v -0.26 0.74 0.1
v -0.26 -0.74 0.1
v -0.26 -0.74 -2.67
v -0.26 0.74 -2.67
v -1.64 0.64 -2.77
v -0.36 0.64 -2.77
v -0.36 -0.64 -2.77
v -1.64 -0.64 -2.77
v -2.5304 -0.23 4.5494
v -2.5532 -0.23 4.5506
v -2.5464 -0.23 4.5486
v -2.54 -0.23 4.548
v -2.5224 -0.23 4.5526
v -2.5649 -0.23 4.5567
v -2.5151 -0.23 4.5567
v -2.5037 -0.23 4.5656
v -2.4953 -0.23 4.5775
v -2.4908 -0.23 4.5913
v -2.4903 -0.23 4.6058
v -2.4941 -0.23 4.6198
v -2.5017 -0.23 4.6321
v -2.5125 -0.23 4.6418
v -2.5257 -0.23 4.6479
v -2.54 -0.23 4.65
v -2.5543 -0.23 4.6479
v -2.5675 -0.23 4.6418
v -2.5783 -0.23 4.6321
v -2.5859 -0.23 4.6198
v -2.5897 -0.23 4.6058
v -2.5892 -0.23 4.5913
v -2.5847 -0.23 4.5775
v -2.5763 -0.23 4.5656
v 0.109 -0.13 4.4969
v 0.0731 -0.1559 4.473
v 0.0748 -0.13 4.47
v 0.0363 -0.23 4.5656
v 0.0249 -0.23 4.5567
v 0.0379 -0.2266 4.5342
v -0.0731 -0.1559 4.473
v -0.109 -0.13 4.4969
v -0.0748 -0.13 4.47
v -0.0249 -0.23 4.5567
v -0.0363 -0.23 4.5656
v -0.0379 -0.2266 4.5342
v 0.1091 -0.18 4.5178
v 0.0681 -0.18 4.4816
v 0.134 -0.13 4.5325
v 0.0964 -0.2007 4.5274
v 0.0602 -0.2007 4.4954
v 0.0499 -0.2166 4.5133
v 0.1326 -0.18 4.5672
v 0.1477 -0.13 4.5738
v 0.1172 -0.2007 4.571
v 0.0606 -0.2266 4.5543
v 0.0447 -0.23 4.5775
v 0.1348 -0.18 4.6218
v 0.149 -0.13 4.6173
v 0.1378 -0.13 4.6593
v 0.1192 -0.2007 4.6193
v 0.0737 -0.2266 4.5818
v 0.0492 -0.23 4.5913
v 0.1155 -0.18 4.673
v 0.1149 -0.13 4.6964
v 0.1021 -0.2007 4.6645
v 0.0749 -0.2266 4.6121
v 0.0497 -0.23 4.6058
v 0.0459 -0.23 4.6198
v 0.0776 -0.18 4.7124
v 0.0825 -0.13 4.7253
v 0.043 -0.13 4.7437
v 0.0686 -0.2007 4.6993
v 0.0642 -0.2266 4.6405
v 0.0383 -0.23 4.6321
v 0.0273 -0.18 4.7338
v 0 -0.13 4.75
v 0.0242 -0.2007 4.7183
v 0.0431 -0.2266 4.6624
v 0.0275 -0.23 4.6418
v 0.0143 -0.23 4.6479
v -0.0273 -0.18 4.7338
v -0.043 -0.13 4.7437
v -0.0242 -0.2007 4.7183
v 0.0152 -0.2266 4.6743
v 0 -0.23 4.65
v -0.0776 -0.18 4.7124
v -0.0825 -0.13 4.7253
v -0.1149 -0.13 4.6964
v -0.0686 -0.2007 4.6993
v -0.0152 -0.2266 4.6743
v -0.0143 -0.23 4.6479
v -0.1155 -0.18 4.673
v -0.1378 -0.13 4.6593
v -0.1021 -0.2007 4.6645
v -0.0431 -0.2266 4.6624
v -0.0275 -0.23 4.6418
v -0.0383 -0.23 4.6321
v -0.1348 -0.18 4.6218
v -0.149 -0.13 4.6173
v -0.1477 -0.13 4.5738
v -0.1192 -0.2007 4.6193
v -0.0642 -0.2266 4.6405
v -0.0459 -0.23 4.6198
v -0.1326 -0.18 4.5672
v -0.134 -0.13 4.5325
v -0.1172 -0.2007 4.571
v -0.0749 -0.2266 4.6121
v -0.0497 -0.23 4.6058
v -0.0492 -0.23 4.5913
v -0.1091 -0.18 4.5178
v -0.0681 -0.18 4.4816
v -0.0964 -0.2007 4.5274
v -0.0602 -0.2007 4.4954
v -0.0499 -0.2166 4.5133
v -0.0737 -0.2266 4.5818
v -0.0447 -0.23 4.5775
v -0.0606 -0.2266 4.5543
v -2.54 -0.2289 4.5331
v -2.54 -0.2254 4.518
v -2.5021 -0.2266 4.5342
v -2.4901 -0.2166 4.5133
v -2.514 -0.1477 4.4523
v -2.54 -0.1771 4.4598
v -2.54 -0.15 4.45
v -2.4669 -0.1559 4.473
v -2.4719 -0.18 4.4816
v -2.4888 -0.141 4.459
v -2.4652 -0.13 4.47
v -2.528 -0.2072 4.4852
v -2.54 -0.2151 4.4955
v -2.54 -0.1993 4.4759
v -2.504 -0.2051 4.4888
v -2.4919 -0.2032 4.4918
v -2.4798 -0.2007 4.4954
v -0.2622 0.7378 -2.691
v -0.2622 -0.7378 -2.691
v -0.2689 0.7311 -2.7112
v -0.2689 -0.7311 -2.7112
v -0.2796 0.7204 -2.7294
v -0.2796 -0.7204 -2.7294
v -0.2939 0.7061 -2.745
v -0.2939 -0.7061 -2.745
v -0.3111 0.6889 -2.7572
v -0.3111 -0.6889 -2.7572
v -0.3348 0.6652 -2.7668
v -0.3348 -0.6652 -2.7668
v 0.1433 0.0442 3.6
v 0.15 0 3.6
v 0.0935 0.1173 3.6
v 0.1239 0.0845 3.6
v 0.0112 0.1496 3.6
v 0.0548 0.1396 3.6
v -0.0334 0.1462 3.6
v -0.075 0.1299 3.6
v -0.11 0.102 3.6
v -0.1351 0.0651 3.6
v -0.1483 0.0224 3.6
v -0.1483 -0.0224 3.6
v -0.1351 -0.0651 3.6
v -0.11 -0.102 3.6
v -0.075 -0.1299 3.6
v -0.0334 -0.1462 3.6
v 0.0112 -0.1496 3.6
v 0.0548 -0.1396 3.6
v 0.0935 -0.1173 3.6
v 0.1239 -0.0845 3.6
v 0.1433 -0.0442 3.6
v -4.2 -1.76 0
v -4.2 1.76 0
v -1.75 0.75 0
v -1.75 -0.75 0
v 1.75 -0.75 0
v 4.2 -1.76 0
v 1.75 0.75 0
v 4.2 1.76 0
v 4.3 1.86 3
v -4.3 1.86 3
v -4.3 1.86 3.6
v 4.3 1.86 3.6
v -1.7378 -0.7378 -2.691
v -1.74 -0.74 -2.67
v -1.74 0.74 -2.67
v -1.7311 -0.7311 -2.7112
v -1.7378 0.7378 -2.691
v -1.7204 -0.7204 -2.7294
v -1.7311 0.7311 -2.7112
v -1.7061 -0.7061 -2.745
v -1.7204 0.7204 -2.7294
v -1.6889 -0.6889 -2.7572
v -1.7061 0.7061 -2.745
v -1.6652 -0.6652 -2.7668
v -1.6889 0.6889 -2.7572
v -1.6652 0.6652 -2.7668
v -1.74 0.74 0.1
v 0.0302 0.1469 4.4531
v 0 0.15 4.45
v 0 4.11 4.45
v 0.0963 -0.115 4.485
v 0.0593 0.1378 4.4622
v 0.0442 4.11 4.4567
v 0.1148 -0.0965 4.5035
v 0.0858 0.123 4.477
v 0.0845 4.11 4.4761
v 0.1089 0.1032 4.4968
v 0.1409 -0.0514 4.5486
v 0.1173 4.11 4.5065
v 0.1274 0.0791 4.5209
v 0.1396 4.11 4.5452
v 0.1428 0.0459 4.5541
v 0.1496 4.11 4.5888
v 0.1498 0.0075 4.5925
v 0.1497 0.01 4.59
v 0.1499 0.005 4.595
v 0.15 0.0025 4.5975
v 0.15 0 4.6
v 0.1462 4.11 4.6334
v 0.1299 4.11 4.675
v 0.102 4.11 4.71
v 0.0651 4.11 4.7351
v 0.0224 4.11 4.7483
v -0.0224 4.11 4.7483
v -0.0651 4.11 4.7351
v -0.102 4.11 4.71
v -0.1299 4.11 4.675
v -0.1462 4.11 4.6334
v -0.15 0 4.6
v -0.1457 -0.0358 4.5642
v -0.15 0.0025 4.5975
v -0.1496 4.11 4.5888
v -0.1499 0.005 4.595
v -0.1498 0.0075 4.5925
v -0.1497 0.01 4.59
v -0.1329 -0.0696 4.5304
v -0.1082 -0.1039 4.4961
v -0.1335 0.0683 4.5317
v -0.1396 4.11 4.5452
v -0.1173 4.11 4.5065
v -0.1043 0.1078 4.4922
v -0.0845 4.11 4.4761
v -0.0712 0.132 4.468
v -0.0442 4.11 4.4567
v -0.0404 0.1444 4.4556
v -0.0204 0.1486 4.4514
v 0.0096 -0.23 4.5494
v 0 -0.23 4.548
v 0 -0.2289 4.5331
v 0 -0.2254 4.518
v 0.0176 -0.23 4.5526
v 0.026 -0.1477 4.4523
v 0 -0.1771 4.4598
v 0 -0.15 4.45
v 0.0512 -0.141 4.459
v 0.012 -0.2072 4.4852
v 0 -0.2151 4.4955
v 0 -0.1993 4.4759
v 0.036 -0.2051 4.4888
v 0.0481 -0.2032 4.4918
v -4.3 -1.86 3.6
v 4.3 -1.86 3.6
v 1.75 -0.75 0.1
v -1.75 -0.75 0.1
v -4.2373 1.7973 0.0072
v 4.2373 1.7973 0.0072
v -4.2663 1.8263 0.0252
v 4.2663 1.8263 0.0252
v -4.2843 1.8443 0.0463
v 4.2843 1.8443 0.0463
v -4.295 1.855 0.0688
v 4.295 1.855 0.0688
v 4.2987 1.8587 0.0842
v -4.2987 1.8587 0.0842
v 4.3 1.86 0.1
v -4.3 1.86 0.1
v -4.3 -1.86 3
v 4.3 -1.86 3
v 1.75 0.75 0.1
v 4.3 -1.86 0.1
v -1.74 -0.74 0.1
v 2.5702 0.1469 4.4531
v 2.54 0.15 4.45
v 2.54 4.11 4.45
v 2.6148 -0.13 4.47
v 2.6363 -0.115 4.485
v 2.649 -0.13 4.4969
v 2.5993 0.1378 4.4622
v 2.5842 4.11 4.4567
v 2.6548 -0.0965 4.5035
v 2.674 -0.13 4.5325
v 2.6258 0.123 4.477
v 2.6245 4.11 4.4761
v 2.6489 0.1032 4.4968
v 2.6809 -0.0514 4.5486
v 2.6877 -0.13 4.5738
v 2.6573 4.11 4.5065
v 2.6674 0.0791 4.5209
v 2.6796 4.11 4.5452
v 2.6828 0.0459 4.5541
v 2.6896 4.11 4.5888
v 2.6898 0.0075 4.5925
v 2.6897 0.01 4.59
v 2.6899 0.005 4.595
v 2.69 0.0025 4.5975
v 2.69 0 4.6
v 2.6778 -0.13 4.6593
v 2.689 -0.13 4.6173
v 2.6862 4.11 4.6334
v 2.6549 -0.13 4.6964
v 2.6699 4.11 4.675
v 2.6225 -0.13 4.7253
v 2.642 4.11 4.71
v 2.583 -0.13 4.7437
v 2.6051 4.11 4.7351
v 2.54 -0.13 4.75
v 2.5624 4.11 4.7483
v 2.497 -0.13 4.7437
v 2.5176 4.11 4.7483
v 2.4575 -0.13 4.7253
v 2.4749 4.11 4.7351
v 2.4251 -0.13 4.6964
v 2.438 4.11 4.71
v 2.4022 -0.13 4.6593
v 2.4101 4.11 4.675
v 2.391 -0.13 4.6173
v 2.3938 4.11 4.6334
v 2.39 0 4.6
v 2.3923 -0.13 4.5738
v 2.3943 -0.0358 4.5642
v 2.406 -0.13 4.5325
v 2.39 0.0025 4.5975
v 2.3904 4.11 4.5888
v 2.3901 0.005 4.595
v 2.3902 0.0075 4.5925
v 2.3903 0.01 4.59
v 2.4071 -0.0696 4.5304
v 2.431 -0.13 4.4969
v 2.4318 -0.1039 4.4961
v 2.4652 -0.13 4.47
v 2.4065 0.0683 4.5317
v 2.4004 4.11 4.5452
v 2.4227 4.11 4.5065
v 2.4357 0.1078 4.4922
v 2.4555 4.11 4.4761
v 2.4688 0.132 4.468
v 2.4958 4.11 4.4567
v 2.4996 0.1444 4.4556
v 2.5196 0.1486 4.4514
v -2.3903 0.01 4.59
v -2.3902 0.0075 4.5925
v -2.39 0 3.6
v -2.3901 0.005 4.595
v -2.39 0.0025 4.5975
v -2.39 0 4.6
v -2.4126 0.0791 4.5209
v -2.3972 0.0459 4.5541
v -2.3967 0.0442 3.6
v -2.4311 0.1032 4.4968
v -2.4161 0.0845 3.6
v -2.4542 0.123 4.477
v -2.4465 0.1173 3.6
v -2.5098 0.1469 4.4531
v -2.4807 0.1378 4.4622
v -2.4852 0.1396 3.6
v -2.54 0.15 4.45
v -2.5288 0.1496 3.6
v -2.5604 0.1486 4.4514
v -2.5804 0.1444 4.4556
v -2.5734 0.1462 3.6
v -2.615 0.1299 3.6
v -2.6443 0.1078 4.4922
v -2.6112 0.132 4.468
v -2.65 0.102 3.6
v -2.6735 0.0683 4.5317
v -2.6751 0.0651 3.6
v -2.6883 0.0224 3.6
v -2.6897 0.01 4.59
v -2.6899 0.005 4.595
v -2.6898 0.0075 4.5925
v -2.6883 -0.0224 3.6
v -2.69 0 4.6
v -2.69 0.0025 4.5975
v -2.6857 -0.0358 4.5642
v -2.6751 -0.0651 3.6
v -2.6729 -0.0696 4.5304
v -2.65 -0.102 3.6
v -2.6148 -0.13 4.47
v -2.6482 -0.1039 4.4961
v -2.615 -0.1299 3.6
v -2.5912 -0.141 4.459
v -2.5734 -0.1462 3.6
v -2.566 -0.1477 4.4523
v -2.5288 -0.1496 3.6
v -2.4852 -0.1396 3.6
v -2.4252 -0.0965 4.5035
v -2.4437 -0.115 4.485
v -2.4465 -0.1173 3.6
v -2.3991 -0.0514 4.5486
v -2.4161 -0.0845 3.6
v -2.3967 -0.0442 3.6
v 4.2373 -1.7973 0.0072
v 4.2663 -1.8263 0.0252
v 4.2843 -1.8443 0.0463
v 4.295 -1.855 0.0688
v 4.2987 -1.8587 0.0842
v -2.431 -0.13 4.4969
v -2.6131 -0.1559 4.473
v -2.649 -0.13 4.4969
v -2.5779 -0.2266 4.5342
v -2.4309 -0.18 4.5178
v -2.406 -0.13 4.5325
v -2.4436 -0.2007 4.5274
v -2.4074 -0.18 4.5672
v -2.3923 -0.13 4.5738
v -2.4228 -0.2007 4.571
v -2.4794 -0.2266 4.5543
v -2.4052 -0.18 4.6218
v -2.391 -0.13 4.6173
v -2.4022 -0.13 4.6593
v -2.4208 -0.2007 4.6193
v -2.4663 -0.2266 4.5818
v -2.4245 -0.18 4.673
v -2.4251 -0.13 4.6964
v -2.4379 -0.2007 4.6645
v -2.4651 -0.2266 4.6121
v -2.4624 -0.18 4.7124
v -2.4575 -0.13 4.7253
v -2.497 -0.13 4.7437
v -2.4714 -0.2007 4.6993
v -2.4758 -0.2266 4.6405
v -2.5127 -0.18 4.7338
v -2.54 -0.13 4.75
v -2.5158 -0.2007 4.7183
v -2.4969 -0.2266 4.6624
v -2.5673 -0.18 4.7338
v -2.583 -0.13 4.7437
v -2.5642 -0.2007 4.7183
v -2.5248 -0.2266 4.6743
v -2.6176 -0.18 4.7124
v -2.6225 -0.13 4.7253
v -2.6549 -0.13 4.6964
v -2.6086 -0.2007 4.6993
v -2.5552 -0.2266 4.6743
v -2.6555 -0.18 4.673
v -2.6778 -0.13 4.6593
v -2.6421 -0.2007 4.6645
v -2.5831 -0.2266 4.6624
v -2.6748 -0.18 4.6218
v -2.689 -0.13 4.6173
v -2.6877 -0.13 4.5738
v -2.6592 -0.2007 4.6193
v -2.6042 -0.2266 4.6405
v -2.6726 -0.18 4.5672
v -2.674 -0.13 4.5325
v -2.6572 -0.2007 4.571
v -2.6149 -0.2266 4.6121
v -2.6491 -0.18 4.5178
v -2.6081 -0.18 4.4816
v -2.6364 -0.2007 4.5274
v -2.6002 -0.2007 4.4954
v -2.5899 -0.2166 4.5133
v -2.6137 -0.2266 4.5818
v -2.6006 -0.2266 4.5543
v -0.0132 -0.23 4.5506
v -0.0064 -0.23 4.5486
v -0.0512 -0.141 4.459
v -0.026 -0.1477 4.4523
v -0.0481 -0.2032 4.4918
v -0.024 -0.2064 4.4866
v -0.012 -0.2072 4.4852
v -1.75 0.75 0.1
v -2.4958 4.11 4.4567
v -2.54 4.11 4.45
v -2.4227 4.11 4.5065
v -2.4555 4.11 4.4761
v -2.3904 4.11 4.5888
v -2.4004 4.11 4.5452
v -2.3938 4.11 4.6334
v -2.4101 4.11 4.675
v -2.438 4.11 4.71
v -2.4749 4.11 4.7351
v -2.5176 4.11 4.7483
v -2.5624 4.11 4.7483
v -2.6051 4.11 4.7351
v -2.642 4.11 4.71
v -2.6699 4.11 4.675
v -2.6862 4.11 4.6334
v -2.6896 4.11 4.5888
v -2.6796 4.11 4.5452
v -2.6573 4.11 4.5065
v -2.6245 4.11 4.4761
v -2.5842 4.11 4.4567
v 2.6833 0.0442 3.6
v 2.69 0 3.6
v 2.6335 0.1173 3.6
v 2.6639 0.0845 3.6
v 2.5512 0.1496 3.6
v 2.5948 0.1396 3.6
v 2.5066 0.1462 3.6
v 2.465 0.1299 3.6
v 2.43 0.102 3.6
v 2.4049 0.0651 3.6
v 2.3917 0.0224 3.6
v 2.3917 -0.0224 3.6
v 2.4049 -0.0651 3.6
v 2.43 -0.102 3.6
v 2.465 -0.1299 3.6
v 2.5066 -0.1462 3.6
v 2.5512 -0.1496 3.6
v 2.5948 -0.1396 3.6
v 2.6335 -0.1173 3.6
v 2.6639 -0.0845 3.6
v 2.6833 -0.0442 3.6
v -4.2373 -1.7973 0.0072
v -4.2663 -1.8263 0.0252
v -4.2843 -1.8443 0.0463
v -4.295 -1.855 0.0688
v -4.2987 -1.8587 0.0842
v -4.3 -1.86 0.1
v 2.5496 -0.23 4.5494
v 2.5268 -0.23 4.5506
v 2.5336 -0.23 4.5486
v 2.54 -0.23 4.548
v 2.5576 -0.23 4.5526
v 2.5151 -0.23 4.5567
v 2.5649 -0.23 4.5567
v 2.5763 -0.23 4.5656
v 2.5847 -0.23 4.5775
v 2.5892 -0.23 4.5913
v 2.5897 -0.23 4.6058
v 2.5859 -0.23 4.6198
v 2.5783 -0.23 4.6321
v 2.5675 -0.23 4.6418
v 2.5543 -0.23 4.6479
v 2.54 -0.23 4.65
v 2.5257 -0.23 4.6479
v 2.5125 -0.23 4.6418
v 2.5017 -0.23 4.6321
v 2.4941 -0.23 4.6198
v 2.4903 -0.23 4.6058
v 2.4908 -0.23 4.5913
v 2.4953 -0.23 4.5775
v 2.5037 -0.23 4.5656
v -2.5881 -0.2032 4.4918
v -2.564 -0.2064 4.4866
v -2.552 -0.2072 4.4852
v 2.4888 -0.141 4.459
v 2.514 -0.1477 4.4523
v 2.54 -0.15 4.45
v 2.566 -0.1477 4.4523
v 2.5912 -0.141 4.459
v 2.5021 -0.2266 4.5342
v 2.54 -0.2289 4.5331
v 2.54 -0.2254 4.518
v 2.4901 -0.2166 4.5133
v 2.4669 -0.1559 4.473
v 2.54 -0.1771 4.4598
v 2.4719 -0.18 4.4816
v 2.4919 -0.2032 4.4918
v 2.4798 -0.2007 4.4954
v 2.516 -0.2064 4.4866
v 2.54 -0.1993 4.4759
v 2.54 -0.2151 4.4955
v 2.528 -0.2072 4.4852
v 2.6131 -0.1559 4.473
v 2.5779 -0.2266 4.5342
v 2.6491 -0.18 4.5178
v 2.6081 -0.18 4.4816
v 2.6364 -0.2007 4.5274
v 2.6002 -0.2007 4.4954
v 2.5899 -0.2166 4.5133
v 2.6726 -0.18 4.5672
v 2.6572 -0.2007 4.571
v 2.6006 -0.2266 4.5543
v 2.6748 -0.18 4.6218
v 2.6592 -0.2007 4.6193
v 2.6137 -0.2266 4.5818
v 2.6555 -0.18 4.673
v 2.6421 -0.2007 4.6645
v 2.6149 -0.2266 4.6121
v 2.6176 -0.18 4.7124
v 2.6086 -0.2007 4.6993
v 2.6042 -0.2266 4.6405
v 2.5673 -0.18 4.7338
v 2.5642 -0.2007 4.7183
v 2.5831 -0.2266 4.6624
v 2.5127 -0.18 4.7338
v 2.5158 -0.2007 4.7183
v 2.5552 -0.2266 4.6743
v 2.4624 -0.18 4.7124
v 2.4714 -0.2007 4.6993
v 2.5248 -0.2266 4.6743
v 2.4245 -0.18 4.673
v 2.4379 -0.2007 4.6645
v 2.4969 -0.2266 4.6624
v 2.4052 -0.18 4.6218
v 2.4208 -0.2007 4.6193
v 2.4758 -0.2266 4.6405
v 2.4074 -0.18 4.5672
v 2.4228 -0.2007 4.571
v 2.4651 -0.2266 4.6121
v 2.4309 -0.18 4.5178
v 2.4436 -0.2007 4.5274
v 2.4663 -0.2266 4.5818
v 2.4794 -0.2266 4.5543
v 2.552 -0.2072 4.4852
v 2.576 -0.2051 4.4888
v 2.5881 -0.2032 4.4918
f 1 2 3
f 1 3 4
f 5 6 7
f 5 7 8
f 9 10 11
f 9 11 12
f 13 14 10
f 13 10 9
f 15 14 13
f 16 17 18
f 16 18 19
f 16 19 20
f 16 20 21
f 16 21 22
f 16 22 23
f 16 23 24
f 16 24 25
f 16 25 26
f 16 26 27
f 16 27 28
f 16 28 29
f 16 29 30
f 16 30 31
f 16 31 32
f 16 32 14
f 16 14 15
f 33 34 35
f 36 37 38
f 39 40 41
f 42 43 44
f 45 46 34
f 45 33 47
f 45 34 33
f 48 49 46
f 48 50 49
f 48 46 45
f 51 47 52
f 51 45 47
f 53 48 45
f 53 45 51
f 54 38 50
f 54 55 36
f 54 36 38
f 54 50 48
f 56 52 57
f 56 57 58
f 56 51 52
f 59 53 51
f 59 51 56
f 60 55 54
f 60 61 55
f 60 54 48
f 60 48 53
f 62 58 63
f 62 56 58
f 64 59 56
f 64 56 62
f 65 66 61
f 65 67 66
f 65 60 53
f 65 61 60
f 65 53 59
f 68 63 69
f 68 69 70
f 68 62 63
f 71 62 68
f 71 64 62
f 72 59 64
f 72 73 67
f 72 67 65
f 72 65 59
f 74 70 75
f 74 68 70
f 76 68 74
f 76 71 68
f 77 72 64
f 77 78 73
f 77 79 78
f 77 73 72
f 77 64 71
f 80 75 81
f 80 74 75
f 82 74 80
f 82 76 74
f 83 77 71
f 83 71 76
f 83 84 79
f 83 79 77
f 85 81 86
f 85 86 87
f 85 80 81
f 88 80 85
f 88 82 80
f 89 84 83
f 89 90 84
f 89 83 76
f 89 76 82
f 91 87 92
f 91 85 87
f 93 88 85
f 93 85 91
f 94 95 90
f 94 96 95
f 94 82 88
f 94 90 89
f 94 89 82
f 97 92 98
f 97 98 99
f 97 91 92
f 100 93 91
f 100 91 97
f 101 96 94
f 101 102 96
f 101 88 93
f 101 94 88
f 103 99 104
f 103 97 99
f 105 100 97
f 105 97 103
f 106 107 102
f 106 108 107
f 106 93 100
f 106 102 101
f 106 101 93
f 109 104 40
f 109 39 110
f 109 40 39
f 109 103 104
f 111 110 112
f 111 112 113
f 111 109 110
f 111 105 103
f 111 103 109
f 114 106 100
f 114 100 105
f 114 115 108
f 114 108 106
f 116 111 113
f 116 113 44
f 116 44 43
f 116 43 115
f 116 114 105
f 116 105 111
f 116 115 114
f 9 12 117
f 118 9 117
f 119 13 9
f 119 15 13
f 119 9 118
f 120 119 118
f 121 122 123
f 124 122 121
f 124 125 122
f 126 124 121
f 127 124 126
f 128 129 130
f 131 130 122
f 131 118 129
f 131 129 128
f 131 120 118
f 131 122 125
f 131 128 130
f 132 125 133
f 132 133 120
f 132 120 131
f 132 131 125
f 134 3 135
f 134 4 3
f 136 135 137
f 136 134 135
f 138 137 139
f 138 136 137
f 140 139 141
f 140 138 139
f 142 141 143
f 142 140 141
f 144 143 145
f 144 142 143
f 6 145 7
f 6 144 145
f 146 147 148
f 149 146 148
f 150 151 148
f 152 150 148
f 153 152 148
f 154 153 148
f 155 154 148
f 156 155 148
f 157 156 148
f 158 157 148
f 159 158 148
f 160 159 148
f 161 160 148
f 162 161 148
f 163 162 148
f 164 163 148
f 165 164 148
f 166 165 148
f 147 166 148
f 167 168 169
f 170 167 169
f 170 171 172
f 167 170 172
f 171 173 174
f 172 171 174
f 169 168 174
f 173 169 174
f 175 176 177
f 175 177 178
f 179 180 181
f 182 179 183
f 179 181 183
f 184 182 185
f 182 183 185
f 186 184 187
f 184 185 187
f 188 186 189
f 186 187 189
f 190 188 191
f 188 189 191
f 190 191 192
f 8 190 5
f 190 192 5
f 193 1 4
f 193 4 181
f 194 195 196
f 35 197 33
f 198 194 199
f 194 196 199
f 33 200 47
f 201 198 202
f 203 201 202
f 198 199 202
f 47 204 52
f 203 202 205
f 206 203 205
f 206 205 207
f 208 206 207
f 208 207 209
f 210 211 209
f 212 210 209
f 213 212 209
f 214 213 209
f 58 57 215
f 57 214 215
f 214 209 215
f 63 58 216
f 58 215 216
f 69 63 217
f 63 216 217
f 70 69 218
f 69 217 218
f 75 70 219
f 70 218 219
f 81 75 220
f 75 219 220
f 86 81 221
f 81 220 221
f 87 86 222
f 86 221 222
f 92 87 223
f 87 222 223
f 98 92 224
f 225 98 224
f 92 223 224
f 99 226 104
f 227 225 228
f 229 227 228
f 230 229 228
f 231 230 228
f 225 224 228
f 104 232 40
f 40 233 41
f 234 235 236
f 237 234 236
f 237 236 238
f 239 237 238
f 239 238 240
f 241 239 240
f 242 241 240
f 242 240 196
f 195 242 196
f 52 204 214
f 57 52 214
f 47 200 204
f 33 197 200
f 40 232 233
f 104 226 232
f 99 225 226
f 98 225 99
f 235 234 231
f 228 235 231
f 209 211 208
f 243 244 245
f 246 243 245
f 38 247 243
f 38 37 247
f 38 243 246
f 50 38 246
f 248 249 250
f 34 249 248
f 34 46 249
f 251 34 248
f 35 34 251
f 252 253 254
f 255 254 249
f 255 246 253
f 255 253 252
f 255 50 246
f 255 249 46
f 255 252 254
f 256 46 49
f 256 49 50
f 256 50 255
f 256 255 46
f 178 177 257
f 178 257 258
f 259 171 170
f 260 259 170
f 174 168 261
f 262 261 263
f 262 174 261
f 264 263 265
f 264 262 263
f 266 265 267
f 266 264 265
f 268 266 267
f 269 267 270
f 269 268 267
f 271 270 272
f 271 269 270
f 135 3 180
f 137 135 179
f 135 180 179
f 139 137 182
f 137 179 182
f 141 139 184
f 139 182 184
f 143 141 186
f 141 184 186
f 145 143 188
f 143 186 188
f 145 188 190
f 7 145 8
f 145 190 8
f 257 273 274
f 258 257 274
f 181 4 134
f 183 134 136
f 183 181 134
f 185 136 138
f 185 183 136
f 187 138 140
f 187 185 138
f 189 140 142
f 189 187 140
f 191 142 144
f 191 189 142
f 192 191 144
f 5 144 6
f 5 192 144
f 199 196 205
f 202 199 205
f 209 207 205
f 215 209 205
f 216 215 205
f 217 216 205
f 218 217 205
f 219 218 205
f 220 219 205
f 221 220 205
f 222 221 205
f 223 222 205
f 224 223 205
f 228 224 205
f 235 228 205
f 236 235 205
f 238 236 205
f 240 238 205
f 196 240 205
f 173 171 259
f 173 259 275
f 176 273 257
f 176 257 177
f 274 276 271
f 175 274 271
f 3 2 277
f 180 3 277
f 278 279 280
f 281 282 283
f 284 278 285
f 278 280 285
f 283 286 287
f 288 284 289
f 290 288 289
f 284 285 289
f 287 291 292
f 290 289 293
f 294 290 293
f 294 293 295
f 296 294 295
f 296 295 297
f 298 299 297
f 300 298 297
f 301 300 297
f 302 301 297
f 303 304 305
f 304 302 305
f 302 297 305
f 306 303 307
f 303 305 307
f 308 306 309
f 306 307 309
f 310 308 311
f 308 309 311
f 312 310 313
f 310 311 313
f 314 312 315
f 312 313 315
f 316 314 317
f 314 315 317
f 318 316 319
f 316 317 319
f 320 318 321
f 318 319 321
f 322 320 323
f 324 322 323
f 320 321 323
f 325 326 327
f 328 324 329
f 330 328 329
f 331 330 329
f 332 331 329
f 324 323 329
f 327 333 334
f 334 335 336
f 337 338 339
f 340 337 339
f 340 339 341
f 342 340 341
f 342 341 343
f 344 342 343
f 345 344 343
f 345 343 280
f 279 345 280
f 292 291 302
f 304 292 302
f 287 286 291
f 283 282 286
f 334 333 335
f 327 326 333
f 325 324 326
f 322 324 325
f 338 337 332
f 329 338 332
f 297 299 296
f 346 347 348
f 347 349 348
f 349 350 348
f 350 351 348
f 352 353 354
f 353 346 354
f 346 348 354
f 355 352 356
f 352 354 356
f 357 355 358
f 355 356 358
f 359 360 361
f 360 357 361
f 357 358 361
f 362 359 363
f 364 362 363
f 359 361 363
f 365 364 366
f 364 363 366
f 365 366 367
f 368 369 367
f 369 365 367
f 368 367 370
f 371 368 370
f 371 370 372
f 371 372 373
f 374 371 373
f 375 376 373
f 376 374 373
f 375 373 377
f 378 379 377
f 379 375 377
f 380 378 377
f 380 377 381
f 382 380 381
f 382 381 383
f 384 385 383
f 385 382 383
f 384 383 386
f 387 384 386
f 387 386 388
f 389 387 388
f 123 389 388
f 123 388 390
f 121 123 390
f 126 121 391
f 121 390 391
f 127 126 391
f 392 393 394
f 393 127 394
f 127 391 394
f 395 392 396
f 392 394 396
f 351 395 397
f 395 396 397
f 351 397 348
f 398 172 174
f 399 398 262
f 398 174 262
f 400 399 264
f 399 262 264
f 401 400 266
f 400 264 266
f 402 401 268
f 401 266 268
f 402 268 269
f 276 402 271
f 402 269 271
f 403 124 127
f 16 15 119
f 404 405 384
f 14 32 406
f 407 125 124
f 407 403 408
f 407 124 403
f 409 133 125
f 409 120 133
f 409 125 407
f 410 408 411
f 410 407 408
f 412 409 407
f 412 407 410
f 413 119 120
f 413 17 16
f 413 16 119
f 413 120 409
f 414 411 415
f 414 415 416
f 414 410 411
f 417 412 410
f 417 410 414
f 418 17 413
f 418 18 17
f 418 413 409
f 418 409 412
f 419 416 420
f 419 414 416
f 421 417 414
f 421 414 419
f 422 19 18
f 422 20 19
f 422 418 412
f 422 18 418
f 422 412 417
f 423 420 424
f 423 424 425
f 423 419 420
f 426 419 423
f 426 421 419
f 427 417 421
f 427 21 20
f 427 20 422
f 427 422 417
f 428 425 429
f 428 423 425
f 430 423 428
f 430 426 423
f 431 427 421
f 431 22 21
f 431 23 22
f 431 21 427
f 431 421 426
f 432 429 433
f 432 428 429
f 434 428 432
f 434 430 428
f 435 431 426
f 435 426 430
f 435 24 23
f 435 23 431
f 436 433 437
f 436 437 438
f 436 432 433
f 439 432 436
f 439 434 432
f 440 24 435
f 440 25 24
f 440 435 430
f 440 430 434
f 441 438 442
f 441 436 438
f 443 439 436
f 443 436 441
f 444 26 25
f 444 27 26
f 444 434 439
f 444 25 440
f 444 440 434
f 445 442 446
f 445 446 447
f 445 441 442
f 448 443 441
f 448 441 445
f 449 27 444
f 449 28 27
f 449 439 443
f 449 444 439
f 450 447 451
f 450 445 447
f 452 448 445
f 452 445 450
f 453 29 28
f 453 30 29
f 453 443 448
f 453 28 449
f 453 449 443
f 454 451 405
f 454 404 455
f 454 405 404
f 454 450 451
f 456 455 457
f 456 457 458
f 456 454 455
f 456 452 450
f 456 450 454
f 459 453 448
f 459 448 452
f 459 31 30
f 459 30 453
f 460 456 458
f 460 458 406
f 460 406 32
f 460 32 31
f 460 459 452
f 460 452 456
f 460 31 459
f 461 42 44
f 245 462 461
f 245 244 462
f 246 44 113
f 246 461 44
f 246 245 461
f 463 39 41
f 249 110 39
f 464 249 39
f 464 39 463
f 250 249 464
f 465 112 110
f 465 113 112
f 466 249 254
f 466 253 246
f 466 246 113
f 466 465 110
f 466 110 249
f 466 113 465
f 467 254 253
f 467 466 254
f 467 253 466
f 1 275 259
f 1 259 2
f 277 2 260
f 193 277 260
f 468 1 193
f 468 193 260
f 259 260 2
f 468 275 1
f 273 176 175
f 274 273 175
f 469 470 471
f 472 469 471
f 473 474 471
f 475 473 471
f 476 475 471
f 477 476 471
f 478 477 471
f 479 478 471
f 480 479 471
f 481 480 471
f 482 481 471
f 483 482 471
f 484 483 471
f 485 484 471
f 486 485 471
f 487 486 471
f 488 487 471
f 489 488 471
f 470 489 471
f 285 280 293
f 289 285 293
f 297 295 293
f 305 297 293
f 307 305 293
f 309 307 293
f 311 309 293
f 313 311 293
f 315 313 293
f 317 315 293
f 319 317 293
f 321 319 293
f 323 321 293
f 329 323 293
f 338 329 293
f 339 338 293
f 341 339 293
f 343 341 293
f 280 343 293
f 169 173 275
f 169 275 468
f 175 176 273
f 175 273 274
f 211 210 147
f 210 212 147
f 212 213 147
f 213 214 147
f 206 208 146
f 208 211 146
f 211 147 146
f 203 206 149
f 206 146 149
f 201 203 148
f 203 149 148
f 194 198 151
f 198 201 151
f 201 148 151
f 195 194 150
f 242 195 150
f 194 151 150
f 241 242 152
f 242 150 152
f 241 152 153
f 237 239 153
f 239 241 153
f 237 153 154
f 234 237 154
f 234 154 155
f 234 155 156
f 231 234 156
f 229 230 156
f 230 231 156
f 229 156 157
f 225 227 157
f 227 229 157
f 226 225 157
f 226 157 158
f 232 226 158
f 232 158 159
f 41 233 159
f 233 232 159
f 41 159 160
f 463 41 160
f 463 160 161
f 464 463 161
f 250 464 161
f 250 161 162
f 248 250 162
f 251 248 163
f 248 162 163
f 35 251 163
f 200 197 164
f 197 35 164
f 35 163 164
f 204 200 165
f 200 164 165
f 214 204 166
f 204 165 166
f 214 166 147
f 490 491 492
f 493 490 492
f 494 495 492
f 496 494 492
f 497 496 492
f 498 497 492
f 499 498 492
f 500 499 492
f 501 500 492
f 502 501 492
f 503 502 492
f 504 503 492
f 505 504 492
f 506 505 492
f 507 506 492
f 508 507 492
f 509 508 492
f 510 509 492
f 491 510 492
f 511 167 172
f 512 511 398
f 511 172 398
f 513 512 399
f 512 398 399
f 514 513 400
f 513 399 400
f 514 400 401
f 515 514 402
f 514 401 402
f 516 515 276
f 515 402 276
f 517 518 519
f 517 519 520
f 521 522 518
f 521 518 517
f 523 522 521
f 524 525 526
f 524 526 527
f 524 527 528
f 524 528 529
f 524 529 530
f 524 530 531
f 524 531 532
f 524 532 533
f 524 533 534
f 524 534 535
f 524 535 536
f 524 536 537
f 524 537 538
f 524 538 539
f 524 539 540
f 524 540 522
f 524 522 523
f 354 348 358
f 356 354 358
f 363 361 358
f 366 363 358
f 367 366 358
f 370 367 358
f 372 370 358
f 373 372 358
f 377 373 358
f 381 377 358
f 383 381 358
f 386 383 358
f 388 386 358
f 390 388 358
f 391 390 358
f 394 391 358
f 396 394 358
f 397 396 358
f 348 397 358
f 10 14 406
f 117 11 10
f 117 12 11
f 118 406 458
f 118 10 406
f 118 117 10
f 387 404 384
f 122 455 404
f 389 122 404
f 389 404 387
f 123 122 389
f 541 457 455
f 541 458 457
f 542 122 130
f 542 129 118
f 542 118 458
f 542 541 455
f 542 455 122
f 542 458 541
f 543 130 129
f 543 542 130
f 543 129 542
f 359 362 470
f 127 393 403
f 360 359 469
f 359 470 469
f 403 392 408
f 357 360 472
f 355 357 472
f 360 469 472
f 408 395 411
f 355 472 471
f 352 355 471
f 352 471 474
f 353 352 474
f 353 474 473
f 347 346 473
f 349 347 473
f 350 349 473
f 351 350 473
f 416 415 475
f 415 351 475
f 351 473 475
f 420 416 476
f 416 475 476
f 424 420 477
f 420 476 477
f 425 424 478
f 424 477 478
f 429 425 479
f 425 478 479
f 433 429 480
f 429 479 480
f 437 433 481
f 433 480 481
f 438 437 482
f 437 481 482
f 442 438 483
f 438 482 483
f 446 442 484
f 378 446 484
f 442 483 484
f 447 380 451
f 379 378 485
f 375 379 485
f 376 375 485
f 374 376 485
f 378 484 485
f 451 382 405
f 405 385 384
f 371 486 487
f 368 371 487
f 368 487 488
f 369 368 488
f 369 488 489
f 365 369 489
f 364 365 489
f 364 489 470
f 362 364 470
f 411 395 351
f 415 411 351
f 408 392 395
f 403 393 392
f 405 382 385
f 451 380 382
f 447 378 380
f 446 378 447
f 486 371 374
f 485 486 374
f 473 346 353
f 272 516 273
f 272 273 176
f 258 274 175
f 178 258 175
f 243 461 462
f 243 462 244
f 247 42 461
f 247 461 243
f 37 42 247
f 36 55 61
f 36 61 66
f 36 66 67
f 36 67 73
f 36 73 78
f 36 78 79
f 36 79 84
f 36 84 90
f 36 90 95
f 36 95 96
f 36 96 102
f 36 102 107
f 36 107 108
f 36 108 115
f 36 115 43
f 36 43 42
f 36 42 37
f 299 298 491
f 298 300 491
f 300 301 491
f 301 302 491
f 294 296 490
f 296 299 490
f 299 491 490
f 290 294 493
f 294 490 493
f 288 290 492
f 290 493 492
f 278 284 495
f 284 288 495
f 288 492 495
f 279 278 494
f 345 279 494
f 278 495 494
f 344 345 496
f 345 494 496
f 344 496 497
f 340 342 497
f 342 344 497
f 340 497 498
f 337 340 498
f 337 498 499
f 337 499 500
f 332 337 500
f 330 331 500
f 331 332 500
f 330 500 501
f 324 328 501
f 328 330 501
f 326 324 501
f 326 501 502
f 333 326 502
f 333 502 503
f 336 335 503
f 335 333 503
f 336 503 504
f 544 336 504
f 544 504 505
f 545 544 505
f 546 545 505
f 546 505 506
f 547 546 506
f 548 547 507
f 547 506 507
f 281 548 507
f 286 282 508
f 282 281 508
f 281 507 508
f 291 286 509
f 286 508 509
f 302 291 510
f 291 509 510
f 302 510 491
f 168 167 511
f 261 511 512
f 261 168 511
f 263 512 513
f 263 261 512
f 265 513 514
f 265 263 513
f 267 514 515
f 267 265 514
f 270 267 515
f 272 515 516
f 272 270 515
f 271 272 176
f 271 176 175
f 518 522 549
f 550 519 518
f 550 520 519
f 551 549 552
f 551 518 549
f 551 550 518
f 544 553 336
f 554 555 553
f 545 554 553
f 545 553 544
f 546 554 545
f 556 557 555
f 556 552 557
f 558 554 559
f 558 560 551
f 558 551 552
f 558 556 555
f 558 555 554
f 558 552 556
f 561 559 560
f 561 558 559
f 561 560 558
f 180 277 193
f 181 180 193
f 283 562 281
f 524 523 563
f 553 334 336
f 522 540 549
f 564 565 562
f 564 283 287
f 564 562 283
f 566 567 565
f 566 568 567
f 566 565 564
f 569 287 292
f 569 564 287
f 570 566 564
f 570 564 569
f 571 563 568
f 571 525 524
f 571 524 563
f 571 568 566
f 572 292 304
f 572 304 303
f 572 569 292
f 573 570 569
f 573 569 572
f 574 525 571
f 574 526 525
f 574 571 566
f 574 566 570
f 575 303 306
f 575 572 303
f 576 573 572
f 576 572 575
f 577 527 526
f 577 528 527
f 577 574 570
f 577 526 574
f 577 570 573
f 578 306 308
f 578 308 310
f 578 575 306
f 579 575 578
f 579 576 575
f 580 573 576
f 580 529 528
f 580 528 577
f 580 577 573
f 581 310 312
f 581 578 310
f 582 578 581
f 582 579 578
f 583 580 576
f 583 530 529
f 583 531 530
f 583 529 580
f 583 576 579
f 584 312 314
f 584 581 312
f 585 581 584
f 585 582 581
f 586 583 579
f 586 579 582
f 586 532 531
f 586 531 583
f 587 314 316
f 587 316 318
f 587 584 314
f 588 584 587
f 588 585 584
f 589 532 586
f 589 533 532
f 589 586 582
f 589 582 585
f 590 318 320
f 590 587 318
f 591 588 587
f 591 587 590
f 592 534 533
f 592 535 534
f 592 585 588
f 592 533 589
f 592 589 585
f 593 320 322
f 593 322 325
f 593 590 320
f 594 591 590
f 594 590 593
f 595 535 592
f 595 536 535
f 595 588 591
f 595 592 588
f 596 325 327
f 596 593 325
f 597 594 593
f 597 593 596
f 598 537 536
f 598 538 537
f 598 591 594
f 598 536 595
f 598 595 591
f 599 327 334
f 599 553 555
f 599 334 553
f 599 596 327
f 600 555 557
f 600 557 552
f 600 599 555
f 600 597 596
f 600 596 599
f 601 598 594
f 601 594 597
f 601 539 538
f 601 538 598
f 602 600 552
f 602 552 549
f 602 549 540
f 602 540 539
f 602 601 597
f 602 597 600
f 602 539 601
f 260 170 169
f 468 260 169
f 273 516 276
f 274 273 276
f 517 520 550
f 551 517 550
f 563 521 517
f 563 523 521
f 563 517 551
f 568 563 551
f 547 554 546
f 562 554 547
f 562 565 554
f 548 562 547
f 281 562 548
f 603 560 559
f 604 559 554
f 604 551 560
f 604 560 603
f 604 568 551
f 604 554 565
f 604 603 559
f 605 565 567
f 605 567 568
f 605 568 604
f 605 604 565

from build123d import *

# Parameters (mm, degrees)
SKETCH_1_W           = 8.6
SKETCH_1_H           = 3.72
EXTRUDE_1_DEPTH      = 3
SKETCH_2_W           = 8.6
SKETCH_2_H           = 3.72
EXTRUDE_2_DEPTH      = 0.6
SKETCH_3_W           = 3.5
SKETCH_3_H           = 1.5
CUT_EXTRUDE_1_DEPTH  = 0.1
SKETCH_4_W           = 1.48
SKETCH_4_H           = 1.48
EXTRUDE_3_DEPTH      = 2.87
FILLET_1_R           = 0.1
FILLET_2_R           = 0.1
SKETCH_5_R           = 0.15
EXTRUDE_4_DEPTH      = 1
EXTRUDE_4_2_DEPTH    = 1
EXTRUDE_4_3_DEPTH    = 1
SKETCH_6_R           = 0.15
EXTRUDE_5_DEPTH      = 0.24
EXTRUDE_5_DEPTH_BACK = 4.1
FILLET_3_R           = 0.1
FILLET_4_R           = 0.1
FILLET_5_R           = 0.1


with BuildPart() as part:
    # Эскиз1 → Бобышка-Вытянуть1 (new body)
    with BuildSketch(Plane.XY):
        Rectangle(SKETCH_1_W, SKETCH_1_H)
    extrude(amount=EXTRUDE_1_DEPTH)

    # Эскиз3 → Вырез-Вытянуть1 (cut)
    with BuildSketch(Plane(origin=(0, 0, 0), x_dir=(-1, 0, 0), z_dir=(0, 0, -1))):
        Rectangle(SKETCH_3_W, SKETCH_3_H)
    extrude(amount=-CUT_EXTRUDE_1_DEPTH, mode=Mode.SUBTRACT)

    # Эскиз4 → Бобышка-Вытянуть3 (add)
    with BuildSketch(Plane(origin=(0, 0, 0.1), x_dir=(-1, 0, 0), z_dir=(0, 0, -1))):
        with Locations((1, 0)):
            Rectangle(SKETCH_4_W, SKETCH_4_H)
    extrude(amount=EXTRUDE_3_DEPTH)

    # Скругление1
    fillet_1_edges = [part.edges().sort_by_distance(p)[0] for p in [
        (-1.74, 0, -2.77),
        (-1, 0.74, -2.77),
        (-0.26, 0, -2.77),
        (-1, -0.74, -2.77),
    ]]
    fillet(fillet_1_edges, radius=FILLET_1_R)

    # Скругление2
    fillet_2_edges = [part.edges().sort_by_distance(p)[0] for p in [
        (0, -1.86, 0),
        (-4.3, 0, 0),
        (0, 1.86, 0),
        (4.3, 0, 0),
    ]]
    fillet(fillet_2_edges, radius=FILLET_2_R)


with BuildPart() as body_2:
    # Эскиз2 → Бобышка-Вытянуть2 (new body)
    with BuildSketch(Plane.XY.offset(3)):
        Rectangle(SKETCH_2_W, SKETCH_2_H)
    extrude(amount=EXTRUDE_2_DEPTH)


with BuildPart() as body_3:
    # Эскиз5 → Бобышка-Вытянуть4 (new body)
    with BuildSketch(Plane.XY.offset(3.6)):
        Circle(SKETCH_5_R)
    extrude(amount=EXTRUDE_4_DEPTH)



with BuildPart() as body_4:
    # Эскиз5 → Extrude 4 2 (new body)
    with BuildSketch(Plane.XY.offset(3.6)):
        with Locations((-2.54, 0)):
            Circle(SKETCH_5_R)
    extrude(amount=EXTRUDE_4_2_DEPTH)


with BuildPart() as body_5:
    # Эскиз5 → Extrude 4 3 (new body)
    with BuildSketch(Plane.XY.offset(3.6)):
        with Locations((2.54, 0)):
            Circle(SKETCH_5_R)
    extrude(amount=EXTRUDE_4_3_DEPTH)


with BuildPart() as body_3_1:
    add(body_3.part)

    add(body_4.part)  # Бобышка-Вытянуть5 merges body 4

    add(body_5.part)  # Бобышка-Вытянуть5 merges body 5
    # Эскиз6 → Бобышка-Вытянуть5 (add, two sides)
    with BuildSketch(Plane(origin=(0, 0.01, 0), x_dir=(-1, 0, 0), z_dir=(0, -1, 0))) as extrude_5_sk:
        with Locations(Location((-2.54, -4.6, 0), (0, 0, 90))):
            Circle(SKETCH_6_R)
        with Locations(Location((0, -4.6, 0), (0, 0, 90))):
            Circle(SKETCH_6_R)
        with Locations(Location((2.54, -4.6, 0), (0, 0, 90))):
            Circle(SKETCH_6_R)
    extrude(amount=EXTRUDE_5_DEPTH)
    extrude(extrude_5_sk.sketch, amount=-EXTRUDE_5_DEPTH_BACK)

    # Скругление3
    fillet_3_edges = [body_3_1.edges().sort_by_distance(p)[0] for p in [
        (2.54, -0.23, 4.75),
    ]]
    fillet(fillet_3_edges, radius=FILLET_3_R)

    # Скругление4
    fillet_4_edges = [body_3_1.edges().sort_by_distance(p)[0] for p in [
        (0, -0.23, 4.75),
    ]]
    fillet(fillet_4_edges, radius=FILLET_4_R)

    # Скругление5
    fillet_5_edges = [body_3_1.edges().sort_by_distance(p)[0] for p in [
        (-2.54, -0.23, 4.75),
    ]]
    fillet(fillet_5_edges, radius=FILLET_5_R)


solid = Compound([part.part, body_2.part, body_3_1.part])
